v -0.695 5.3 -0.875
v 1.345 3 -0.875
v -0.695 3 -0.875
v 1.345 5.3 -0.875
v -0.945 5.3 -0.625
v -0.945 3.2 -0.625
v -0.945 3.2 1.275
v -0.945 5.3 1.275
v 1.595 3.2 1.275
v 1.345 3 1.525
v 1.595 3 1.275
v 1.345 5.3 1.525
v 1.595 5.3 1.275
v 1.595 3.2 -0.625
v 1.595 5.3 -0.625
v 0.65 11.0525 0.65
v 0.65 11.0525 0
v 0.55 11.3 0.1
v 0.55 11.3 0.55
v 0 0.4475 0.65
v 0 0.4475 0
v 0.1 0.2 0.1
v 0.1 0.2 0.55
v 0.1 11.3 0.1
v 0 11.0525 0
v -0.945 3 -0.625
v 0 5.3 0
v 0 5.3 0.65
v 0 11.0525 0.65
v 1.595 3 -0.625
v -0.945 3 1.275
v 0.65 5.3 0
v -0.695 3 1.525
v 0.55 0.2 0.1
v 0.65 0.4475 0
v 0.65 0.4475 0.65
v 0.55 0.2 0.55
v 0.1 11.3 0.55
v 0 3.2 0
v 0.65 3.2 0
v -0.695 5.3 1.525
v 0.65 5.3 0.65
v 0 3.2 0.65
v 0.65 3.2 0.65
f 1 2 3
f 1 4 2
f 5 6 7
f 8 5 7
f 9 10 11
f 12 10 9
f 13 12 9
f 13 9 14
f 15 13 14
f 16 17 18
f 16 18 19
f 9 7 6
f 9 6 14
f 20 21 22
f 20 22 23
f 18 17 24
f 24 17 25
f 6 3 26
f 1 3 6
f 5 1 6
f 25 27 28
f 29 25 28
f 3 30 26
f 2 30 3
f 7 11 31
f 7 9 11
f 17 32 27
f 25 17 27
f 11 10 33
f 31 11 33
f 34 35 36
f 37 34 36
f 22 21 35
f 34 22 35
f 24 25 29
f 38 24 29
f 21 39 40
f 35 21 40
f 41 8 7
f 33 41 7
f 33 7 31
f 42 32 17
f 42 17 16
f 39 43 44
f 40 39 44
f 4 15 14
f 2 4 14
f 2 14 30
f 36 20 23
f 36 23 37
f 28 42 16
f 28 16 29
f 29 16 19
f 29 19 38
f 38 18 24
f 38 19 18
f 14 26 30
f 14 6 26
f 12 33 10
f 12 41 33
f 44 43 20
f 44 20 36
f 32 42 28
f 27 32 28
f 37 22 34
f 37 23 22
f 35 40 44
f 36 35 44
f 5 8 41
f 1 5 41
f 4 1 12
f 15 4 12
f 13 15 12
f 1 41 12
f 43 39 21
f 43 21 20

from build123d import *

# Parameters (mm, degrees)
SALIENTE_EXTRUIR1_DEPTH = 2.1
SALIENTE_EXTRUIR2_DEPTH = 0.2
SALIENTE_EXTRUIR3_DEPTH = 0.2
CROQUIS4_W              = 0.65
CROQUIS4_H              = 0.65
SALIENTE_EXTRUIR4_DEPTH = 3
CROQUIS5_W              = 0.65
CROQUIS5_H              = 0.65
SALIENTE_EXTRUIR5_DEPTH = 6
CHAFL_N1_SIZE           = 0.25
CHAFL_N2_SIZE           = 0.1
CHAFL_N2_SIZE2          = 0.247508685
CHAFL_N3_SIZE           = 0.1
CHAFL_N3_SIZE2          = 0.247508685


with BuildPart() as part:
    # Croquis1 → Saliente-Extruir1 (new body)
    with BuildSketch(Plane.XZ.offset(-3.2)):
        Polygon((-0.945, 1.525), (-0.945, -0.625), (-0.695, -0.875), (1.595, -0.875), (1.595, 1.275), (1.345, 1.525), align=None)
    extrude(amount=-SALIENTE_EXTRUIR1_DEPTH)

    # Croquis2 → Saliente-Extruir2 (add)
    with BuildSketch(Plane.XZ.offset(-3.2)):
        Polygon((-0.945, 1.525), (1.345, 1.525), (1.595, 1.275), (-0.945, 1.275), align=None)
    extrude(amount=SALIENTE_EXTRUIR2_DEPTH)

    # Croquis3 → Saliente-Extruir3 (add)
    with BuildSketch(Plane.XZ.offset(-3.2)):
        Polygon((1.595, -0.875), (-0.695, -0.875), (-0.945, -0.625), (1.595, -0.625), align=None)
    extrude(amount=SALIENTE_EXTRUIR3_DEPTH)

    # Chaflán1
    chafl_n1_edges = [part.edges().sort_by_distance(p)[0] for p in [
        (-0.945, 4.15, 1.525),
        (1.595, 4.15, -0.875),
    ]]
    chamfer(chafl_n1_edges, length=CHAFL_N1_SIZE)


with BuildPart() as body_2:
    # Croquis4 → Saliente-Extruir4 (new body)
    with BuildSketch(Plane.XZ.offset(-3.2)):
        with Locations((0.325, 0.325)):
            Rectangle(CROQUIS4_W, CROQUIS4_H)
    extrude(amount=SALIENTE_EXTRUIR4_DEPTH)

    # Chaflán2
    chafl_n2_edges = [body_2.edges().sort_by_distance(p)[0] for p in [
        (0.325, 0.2, 0),
        (0.65, 0.2, 0.325),
        (0.325, 0.2, 0.65),
        (0, 0.2, 0.325),
    ]]
    chafl_n2_side = [body_2.faces().sort_by_distance(p)[0] for p in [
        (0.325, 0.2, 0.325),
    ]]
    chamfer(chafl_n2_edges, length=CHAFL_N2_SIZE, length2=CHAFL_N2_SIZE2, reference=chafl_n2_side[0])


with BuildPart() as body_3:
    # Croquis5 → Saliente-Extruir5 (new body)
    with BuildSketch(Plane(origin=(0, 5.3, 0), x_dir=(-1, 0, 0), z_dir=(0, 1, 0))):
        with Locations((-0.325, 0.325)):
            Rectangle(CROQUIS5_W, CROQUIS5_H)
    extrude(amount=SALIENTE_EXTRUIR5_DEPTH)

    # Chaflán3
    chafl_n3_edges = [body_3.edges().sort_by_distance(p)[0] for p in [
        (0.325, 11.3, 0),
        (0, 11.3, 0.325),
        (0.325, 11.3, 0.65),
        (0.65, 11.3, 0.325),
    ]]
    chafl_n3_side = [body_3.faces().sort_by_distance(p)[0] for p in [
        (0.325, 11.3, 0.325),
    ]]
    chamfer(chafl_n3_edges, length=CHAFL_N3_SIZE, length2=CHAFL_N3_SIZE2, reference=chafl_n3_side[0])


solid = Compound([part.part, body_2.part, body_3.part])
